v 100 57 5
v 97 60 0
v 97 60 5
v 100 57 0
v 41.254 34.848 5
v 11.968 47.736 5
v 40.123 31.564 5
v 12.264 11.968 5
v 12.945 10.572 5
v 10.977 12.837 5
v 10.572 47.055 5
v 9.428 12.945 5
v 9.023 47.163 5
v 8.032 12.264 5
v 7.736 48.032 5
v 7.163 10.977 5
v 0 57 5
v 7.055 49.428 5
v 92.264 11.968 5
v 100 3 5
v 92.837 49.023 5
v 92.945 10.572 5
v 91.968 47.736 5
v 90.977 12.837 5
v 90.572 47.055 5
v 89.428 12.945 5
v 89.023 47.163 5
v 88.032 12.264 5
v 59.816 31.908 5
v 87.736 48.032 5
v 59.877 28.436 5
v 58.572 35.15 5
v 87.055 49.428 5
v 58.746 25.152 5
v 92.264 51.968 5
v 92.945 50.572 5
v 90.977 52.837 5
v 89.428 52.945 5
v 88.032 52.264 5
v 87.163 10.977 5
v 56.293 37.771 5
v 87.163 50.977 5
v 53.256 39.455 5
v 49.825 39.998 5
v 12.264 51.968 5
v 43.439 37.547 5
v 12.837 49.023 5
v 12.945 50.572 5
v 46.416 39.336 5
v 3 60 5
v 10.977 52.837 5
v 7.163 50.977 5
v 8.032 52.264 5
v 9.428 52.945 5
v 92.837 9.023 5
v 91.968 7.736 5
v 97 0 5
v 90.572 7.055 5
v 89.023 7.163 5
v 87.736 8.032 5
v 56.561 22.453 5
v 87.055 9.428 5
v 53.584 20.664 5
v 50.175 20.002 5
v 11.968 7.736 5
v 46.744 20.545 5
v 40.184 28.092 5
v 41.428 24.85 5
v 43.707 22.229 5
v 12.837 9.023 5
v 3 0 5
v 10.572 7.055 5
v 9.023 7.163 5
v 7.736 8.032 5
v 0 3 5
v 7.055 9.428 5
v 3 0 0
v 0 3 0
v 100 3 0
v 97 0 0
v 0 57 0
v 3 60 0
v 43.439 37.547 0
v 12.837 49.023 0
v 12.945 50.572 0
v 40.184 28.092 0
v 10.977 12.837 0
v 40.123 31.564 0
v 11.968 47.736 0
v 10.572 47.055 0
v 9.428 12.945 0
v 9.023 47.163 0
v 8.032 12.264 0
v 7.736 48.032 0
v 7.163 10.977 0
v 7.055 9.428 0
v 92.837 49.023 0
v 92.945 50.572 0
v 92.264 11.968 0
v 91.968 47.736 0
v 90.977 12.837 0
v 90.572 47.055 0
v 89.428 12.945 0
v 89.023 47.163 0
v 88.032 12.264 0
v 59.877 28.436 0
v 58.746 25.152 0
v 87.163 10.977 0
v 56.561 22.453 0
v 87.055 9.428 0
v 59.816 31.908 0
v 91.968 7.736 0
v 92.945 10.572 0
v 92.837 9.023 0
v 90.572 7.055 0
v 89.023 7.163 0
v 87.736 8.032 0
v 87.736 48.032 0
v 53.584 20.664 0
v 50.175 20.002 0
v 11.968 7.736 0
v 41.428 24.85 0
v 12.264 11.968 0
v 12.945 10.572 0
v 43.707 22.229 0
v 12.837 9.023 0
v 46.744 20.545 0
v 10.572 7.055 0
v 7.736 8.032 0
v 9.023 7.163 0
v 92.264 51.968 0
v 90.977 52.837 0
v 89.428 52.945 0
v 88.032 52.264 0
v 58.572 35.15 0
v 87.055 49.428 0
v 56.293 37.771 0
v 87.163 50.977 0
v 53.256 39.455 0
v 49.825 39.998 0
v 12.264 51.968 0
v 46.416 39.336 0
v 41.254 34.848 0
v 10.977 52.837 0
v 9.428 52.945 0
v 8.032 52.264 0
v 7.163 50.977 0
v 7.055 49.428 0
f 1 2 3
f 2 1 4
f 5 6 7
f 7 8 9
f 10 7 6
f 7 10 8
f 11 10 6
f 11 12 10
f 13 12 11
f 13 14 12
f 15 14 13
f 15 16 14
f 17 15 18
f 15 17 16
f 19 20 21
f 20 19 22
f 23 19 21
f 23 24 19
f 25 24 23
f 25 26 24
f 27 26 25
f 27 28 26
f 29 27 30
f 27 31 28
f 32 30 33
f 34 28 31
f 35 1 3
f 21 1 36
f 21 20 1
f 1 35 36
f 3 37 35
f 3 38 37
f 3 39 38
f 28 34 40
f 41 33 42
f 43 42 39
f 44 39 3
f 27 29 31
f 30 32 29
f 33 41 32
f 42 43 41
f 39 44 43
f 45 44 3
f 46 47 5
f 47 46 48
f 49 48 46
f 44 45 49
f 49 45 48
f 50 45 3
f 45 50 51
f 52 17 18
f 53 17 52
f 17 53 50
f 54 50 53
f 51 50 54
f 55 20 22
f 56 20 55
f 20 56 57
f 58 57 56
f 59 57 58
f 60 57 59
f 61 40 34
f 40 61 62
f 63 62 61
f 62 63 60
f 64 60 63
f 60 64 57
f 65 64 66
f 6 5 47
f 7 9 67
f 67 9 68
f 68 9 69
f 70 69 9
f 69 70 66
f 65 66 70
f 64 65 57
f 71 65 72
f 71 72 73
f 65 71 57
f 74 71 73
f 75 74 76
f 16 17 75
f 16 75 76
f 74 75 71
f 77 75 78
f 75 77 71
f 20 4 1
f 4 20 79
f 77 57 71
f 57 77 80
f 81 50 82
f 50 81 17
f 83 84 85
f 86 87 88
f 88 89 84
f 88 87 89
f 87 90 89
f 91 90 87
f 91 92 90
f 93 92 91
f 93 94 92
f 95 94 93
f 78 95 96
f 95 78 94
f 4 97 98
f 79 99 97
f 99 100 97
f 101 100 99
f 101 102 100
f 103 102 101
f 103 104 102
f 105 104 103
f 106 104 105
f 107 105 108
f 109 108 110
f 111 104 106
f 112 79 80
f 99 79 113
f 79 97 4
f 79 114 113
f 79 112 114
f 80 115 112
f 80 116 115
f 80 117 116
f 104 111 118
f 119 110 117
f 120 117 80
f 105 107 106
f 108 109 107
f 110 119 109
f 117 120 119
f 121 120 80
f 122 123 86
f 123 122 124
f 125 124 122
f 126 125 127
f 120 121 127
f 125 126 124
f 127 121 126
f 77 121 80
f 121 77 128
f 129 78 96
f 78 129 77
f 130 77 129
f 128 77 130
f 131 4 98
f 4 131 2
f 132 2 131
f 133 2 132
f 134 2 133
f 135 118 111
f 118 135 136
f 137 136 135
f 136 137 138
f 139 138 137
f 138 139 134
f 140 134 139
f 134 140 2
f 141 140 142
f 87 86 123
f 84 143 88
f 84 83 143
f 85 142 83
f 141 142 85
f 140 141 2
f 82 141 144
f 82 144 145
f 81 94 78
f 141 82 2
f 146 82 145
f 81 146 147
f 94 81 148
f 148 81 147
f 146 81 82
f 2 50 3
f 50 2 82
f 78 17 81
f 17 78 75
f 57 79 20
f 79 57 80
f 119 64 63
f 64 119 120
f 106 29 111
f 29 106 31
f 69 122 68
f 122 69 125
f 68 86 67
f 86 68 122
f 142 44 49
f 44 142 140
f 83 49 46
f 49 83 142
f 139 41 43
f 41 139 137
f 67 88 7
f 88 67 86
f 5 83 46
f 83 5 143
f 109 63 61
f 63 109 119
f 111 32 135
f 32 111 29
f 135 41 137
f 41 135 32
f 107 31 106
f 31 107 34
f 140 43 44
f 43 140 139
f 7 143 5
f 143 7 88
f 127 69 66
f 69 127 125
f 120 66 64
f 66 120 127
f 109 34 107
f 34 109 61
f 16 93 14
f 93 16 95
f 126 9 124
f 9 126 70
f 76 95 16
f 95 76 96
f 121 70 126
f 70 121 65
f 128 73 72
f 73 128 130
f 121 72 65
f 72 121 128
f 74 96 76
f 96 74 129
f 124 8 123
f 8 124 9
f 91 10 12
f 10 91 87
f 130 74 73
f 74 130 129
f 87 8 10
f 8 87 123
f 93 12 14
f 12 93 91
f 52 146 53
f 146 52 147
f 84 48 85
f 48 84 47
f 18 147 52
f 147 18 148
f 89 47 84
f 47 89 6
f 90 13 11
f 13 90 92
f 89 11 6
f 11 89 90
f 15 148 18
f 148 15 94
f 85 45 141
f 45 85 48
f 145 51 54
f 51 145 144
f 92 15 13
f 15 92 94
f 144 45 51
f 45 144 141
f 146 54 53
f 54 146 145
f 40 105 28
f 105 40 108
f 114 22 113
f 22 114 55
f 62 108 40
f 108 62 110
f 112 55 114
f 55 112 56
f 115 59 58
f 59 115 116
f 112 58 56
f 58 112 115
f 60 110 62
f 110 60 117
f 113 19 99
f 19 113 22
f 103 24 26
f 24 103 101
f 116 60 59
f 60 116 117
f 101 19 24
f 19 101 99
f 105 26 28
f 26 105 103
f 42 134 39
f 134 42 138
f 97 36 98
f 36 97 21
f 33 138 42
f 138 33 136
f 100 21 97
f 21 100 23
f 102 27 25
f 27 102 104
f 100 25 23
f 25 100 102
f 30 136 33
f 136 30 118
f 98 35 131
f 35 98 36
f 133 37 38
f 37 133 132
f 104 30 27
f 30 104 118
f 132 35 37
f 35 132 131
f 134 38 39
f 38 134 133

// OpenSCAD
$fn = 32;

// ----------------------------------------------------------------------
// Spacer plate: rect 100 x 60
// ----------------------------------------------------------------------

// --- parameters (mm) ---
bore_r = 10;              // centre bore radius
bolt_r = 3;               // bolt hole radius
plate_t = 5;              // plate thickness, Z (extrusion height)
plate_l = 100;            // plate length, X
plate_w = 60;             // plate width, Y
inset = 10;               // corner hole inset

profile = [[3, 0], [97, 0], [100, 3], [100, 57], [97, 60], [3, 60], [0, 57], [0, 3]];  // primary outline, 8 points, counter clockwise
void_1 = [[59.816, 31.908], [58.572, 35.15], [56.293, 37.771], [53.256, 39.455], [49.825, 39.998], [46.416, 39.336], [43.439, 37.547], [41.254, 34.848], [40.123, 31.564], [40.184, 28.092], [41.428, 24.85], [43.707, 22.229], [46.744, 20.545], [50.175, 20.002], [53.584, 20.664], [56.561, 22.453], [58.746, 25.152], [59.877, 28.436]];  // centre bore, 18 points
void_2 = [[12.945, 10.572], [12.264, 11.968], [10.977, 12.837], [9.428, 12.945], [8.032, 12.264], [7.163, 10.977], [7.055, 9.428], [7.736, 8.032], [9.023, 7.163], [10.572, 7.055], [11.968, 7.736], [12.837, 9.023]];  // corner hole, 12 points
void_3 = [[12.945, 50.572], [12.264, 51.968], [10.977, 52.837], [9.428, 52.945], [8.032, 52.264], [7.163, 50.977], [7.055, 49.428], [7.736, 48.032], [9.023, 47.163], [10.572, 47.055], [11.968, 47.736], [12.837, 49.023]];  // corner hole, 12 points
void_4 = [[92.945, 10.572], [92.264, 11.968], [90.977, 12.837], [89.428, 12.945], [88.032, 12.264], [87.163, 10.977], [87.055, 9.428], [87.736, 8.032], [89.023, 7.163], [90.572, 7.055], [91.968, 7.736], [92.837, 9.023]];  // corner hole, 12 points
void_5 = [[92.945, 50.572], [92.264, 51.968], [90.977, 52.837], [89.428, 52.945], [88.032, 52.264], [87.163, 50.977], [87.055, 49.428], [87.736, 48.032], [89.023, 47.163], [90.572, 47.055], [91.968, 47.736], [92.837, 49.023]];  // corner hole, 12 points

// --- the one profile operation ---
difference() {
  linear_extrude(height = plate_t) polygon(points = profile);
  translate([0, 0, -1])
    linear_extrude(height = plate_t + 2) polygon(points = void_1);
  translate([0, 0, -1])
    linear_extrude(height = plate_t + 2) polygon(points = void_2);
  translate([0, 0, -1])
    linear_extrude(height = plate_t + 2) polygon(points = void_3);
  translate([0, 0, -1])
    linear_extrude(height = plate_t + 2) polygon(points = void_4);
  translate([0, 0, -1])
    linear_extrude(height = plate_t + 2) polygon(points = void_5);
}
